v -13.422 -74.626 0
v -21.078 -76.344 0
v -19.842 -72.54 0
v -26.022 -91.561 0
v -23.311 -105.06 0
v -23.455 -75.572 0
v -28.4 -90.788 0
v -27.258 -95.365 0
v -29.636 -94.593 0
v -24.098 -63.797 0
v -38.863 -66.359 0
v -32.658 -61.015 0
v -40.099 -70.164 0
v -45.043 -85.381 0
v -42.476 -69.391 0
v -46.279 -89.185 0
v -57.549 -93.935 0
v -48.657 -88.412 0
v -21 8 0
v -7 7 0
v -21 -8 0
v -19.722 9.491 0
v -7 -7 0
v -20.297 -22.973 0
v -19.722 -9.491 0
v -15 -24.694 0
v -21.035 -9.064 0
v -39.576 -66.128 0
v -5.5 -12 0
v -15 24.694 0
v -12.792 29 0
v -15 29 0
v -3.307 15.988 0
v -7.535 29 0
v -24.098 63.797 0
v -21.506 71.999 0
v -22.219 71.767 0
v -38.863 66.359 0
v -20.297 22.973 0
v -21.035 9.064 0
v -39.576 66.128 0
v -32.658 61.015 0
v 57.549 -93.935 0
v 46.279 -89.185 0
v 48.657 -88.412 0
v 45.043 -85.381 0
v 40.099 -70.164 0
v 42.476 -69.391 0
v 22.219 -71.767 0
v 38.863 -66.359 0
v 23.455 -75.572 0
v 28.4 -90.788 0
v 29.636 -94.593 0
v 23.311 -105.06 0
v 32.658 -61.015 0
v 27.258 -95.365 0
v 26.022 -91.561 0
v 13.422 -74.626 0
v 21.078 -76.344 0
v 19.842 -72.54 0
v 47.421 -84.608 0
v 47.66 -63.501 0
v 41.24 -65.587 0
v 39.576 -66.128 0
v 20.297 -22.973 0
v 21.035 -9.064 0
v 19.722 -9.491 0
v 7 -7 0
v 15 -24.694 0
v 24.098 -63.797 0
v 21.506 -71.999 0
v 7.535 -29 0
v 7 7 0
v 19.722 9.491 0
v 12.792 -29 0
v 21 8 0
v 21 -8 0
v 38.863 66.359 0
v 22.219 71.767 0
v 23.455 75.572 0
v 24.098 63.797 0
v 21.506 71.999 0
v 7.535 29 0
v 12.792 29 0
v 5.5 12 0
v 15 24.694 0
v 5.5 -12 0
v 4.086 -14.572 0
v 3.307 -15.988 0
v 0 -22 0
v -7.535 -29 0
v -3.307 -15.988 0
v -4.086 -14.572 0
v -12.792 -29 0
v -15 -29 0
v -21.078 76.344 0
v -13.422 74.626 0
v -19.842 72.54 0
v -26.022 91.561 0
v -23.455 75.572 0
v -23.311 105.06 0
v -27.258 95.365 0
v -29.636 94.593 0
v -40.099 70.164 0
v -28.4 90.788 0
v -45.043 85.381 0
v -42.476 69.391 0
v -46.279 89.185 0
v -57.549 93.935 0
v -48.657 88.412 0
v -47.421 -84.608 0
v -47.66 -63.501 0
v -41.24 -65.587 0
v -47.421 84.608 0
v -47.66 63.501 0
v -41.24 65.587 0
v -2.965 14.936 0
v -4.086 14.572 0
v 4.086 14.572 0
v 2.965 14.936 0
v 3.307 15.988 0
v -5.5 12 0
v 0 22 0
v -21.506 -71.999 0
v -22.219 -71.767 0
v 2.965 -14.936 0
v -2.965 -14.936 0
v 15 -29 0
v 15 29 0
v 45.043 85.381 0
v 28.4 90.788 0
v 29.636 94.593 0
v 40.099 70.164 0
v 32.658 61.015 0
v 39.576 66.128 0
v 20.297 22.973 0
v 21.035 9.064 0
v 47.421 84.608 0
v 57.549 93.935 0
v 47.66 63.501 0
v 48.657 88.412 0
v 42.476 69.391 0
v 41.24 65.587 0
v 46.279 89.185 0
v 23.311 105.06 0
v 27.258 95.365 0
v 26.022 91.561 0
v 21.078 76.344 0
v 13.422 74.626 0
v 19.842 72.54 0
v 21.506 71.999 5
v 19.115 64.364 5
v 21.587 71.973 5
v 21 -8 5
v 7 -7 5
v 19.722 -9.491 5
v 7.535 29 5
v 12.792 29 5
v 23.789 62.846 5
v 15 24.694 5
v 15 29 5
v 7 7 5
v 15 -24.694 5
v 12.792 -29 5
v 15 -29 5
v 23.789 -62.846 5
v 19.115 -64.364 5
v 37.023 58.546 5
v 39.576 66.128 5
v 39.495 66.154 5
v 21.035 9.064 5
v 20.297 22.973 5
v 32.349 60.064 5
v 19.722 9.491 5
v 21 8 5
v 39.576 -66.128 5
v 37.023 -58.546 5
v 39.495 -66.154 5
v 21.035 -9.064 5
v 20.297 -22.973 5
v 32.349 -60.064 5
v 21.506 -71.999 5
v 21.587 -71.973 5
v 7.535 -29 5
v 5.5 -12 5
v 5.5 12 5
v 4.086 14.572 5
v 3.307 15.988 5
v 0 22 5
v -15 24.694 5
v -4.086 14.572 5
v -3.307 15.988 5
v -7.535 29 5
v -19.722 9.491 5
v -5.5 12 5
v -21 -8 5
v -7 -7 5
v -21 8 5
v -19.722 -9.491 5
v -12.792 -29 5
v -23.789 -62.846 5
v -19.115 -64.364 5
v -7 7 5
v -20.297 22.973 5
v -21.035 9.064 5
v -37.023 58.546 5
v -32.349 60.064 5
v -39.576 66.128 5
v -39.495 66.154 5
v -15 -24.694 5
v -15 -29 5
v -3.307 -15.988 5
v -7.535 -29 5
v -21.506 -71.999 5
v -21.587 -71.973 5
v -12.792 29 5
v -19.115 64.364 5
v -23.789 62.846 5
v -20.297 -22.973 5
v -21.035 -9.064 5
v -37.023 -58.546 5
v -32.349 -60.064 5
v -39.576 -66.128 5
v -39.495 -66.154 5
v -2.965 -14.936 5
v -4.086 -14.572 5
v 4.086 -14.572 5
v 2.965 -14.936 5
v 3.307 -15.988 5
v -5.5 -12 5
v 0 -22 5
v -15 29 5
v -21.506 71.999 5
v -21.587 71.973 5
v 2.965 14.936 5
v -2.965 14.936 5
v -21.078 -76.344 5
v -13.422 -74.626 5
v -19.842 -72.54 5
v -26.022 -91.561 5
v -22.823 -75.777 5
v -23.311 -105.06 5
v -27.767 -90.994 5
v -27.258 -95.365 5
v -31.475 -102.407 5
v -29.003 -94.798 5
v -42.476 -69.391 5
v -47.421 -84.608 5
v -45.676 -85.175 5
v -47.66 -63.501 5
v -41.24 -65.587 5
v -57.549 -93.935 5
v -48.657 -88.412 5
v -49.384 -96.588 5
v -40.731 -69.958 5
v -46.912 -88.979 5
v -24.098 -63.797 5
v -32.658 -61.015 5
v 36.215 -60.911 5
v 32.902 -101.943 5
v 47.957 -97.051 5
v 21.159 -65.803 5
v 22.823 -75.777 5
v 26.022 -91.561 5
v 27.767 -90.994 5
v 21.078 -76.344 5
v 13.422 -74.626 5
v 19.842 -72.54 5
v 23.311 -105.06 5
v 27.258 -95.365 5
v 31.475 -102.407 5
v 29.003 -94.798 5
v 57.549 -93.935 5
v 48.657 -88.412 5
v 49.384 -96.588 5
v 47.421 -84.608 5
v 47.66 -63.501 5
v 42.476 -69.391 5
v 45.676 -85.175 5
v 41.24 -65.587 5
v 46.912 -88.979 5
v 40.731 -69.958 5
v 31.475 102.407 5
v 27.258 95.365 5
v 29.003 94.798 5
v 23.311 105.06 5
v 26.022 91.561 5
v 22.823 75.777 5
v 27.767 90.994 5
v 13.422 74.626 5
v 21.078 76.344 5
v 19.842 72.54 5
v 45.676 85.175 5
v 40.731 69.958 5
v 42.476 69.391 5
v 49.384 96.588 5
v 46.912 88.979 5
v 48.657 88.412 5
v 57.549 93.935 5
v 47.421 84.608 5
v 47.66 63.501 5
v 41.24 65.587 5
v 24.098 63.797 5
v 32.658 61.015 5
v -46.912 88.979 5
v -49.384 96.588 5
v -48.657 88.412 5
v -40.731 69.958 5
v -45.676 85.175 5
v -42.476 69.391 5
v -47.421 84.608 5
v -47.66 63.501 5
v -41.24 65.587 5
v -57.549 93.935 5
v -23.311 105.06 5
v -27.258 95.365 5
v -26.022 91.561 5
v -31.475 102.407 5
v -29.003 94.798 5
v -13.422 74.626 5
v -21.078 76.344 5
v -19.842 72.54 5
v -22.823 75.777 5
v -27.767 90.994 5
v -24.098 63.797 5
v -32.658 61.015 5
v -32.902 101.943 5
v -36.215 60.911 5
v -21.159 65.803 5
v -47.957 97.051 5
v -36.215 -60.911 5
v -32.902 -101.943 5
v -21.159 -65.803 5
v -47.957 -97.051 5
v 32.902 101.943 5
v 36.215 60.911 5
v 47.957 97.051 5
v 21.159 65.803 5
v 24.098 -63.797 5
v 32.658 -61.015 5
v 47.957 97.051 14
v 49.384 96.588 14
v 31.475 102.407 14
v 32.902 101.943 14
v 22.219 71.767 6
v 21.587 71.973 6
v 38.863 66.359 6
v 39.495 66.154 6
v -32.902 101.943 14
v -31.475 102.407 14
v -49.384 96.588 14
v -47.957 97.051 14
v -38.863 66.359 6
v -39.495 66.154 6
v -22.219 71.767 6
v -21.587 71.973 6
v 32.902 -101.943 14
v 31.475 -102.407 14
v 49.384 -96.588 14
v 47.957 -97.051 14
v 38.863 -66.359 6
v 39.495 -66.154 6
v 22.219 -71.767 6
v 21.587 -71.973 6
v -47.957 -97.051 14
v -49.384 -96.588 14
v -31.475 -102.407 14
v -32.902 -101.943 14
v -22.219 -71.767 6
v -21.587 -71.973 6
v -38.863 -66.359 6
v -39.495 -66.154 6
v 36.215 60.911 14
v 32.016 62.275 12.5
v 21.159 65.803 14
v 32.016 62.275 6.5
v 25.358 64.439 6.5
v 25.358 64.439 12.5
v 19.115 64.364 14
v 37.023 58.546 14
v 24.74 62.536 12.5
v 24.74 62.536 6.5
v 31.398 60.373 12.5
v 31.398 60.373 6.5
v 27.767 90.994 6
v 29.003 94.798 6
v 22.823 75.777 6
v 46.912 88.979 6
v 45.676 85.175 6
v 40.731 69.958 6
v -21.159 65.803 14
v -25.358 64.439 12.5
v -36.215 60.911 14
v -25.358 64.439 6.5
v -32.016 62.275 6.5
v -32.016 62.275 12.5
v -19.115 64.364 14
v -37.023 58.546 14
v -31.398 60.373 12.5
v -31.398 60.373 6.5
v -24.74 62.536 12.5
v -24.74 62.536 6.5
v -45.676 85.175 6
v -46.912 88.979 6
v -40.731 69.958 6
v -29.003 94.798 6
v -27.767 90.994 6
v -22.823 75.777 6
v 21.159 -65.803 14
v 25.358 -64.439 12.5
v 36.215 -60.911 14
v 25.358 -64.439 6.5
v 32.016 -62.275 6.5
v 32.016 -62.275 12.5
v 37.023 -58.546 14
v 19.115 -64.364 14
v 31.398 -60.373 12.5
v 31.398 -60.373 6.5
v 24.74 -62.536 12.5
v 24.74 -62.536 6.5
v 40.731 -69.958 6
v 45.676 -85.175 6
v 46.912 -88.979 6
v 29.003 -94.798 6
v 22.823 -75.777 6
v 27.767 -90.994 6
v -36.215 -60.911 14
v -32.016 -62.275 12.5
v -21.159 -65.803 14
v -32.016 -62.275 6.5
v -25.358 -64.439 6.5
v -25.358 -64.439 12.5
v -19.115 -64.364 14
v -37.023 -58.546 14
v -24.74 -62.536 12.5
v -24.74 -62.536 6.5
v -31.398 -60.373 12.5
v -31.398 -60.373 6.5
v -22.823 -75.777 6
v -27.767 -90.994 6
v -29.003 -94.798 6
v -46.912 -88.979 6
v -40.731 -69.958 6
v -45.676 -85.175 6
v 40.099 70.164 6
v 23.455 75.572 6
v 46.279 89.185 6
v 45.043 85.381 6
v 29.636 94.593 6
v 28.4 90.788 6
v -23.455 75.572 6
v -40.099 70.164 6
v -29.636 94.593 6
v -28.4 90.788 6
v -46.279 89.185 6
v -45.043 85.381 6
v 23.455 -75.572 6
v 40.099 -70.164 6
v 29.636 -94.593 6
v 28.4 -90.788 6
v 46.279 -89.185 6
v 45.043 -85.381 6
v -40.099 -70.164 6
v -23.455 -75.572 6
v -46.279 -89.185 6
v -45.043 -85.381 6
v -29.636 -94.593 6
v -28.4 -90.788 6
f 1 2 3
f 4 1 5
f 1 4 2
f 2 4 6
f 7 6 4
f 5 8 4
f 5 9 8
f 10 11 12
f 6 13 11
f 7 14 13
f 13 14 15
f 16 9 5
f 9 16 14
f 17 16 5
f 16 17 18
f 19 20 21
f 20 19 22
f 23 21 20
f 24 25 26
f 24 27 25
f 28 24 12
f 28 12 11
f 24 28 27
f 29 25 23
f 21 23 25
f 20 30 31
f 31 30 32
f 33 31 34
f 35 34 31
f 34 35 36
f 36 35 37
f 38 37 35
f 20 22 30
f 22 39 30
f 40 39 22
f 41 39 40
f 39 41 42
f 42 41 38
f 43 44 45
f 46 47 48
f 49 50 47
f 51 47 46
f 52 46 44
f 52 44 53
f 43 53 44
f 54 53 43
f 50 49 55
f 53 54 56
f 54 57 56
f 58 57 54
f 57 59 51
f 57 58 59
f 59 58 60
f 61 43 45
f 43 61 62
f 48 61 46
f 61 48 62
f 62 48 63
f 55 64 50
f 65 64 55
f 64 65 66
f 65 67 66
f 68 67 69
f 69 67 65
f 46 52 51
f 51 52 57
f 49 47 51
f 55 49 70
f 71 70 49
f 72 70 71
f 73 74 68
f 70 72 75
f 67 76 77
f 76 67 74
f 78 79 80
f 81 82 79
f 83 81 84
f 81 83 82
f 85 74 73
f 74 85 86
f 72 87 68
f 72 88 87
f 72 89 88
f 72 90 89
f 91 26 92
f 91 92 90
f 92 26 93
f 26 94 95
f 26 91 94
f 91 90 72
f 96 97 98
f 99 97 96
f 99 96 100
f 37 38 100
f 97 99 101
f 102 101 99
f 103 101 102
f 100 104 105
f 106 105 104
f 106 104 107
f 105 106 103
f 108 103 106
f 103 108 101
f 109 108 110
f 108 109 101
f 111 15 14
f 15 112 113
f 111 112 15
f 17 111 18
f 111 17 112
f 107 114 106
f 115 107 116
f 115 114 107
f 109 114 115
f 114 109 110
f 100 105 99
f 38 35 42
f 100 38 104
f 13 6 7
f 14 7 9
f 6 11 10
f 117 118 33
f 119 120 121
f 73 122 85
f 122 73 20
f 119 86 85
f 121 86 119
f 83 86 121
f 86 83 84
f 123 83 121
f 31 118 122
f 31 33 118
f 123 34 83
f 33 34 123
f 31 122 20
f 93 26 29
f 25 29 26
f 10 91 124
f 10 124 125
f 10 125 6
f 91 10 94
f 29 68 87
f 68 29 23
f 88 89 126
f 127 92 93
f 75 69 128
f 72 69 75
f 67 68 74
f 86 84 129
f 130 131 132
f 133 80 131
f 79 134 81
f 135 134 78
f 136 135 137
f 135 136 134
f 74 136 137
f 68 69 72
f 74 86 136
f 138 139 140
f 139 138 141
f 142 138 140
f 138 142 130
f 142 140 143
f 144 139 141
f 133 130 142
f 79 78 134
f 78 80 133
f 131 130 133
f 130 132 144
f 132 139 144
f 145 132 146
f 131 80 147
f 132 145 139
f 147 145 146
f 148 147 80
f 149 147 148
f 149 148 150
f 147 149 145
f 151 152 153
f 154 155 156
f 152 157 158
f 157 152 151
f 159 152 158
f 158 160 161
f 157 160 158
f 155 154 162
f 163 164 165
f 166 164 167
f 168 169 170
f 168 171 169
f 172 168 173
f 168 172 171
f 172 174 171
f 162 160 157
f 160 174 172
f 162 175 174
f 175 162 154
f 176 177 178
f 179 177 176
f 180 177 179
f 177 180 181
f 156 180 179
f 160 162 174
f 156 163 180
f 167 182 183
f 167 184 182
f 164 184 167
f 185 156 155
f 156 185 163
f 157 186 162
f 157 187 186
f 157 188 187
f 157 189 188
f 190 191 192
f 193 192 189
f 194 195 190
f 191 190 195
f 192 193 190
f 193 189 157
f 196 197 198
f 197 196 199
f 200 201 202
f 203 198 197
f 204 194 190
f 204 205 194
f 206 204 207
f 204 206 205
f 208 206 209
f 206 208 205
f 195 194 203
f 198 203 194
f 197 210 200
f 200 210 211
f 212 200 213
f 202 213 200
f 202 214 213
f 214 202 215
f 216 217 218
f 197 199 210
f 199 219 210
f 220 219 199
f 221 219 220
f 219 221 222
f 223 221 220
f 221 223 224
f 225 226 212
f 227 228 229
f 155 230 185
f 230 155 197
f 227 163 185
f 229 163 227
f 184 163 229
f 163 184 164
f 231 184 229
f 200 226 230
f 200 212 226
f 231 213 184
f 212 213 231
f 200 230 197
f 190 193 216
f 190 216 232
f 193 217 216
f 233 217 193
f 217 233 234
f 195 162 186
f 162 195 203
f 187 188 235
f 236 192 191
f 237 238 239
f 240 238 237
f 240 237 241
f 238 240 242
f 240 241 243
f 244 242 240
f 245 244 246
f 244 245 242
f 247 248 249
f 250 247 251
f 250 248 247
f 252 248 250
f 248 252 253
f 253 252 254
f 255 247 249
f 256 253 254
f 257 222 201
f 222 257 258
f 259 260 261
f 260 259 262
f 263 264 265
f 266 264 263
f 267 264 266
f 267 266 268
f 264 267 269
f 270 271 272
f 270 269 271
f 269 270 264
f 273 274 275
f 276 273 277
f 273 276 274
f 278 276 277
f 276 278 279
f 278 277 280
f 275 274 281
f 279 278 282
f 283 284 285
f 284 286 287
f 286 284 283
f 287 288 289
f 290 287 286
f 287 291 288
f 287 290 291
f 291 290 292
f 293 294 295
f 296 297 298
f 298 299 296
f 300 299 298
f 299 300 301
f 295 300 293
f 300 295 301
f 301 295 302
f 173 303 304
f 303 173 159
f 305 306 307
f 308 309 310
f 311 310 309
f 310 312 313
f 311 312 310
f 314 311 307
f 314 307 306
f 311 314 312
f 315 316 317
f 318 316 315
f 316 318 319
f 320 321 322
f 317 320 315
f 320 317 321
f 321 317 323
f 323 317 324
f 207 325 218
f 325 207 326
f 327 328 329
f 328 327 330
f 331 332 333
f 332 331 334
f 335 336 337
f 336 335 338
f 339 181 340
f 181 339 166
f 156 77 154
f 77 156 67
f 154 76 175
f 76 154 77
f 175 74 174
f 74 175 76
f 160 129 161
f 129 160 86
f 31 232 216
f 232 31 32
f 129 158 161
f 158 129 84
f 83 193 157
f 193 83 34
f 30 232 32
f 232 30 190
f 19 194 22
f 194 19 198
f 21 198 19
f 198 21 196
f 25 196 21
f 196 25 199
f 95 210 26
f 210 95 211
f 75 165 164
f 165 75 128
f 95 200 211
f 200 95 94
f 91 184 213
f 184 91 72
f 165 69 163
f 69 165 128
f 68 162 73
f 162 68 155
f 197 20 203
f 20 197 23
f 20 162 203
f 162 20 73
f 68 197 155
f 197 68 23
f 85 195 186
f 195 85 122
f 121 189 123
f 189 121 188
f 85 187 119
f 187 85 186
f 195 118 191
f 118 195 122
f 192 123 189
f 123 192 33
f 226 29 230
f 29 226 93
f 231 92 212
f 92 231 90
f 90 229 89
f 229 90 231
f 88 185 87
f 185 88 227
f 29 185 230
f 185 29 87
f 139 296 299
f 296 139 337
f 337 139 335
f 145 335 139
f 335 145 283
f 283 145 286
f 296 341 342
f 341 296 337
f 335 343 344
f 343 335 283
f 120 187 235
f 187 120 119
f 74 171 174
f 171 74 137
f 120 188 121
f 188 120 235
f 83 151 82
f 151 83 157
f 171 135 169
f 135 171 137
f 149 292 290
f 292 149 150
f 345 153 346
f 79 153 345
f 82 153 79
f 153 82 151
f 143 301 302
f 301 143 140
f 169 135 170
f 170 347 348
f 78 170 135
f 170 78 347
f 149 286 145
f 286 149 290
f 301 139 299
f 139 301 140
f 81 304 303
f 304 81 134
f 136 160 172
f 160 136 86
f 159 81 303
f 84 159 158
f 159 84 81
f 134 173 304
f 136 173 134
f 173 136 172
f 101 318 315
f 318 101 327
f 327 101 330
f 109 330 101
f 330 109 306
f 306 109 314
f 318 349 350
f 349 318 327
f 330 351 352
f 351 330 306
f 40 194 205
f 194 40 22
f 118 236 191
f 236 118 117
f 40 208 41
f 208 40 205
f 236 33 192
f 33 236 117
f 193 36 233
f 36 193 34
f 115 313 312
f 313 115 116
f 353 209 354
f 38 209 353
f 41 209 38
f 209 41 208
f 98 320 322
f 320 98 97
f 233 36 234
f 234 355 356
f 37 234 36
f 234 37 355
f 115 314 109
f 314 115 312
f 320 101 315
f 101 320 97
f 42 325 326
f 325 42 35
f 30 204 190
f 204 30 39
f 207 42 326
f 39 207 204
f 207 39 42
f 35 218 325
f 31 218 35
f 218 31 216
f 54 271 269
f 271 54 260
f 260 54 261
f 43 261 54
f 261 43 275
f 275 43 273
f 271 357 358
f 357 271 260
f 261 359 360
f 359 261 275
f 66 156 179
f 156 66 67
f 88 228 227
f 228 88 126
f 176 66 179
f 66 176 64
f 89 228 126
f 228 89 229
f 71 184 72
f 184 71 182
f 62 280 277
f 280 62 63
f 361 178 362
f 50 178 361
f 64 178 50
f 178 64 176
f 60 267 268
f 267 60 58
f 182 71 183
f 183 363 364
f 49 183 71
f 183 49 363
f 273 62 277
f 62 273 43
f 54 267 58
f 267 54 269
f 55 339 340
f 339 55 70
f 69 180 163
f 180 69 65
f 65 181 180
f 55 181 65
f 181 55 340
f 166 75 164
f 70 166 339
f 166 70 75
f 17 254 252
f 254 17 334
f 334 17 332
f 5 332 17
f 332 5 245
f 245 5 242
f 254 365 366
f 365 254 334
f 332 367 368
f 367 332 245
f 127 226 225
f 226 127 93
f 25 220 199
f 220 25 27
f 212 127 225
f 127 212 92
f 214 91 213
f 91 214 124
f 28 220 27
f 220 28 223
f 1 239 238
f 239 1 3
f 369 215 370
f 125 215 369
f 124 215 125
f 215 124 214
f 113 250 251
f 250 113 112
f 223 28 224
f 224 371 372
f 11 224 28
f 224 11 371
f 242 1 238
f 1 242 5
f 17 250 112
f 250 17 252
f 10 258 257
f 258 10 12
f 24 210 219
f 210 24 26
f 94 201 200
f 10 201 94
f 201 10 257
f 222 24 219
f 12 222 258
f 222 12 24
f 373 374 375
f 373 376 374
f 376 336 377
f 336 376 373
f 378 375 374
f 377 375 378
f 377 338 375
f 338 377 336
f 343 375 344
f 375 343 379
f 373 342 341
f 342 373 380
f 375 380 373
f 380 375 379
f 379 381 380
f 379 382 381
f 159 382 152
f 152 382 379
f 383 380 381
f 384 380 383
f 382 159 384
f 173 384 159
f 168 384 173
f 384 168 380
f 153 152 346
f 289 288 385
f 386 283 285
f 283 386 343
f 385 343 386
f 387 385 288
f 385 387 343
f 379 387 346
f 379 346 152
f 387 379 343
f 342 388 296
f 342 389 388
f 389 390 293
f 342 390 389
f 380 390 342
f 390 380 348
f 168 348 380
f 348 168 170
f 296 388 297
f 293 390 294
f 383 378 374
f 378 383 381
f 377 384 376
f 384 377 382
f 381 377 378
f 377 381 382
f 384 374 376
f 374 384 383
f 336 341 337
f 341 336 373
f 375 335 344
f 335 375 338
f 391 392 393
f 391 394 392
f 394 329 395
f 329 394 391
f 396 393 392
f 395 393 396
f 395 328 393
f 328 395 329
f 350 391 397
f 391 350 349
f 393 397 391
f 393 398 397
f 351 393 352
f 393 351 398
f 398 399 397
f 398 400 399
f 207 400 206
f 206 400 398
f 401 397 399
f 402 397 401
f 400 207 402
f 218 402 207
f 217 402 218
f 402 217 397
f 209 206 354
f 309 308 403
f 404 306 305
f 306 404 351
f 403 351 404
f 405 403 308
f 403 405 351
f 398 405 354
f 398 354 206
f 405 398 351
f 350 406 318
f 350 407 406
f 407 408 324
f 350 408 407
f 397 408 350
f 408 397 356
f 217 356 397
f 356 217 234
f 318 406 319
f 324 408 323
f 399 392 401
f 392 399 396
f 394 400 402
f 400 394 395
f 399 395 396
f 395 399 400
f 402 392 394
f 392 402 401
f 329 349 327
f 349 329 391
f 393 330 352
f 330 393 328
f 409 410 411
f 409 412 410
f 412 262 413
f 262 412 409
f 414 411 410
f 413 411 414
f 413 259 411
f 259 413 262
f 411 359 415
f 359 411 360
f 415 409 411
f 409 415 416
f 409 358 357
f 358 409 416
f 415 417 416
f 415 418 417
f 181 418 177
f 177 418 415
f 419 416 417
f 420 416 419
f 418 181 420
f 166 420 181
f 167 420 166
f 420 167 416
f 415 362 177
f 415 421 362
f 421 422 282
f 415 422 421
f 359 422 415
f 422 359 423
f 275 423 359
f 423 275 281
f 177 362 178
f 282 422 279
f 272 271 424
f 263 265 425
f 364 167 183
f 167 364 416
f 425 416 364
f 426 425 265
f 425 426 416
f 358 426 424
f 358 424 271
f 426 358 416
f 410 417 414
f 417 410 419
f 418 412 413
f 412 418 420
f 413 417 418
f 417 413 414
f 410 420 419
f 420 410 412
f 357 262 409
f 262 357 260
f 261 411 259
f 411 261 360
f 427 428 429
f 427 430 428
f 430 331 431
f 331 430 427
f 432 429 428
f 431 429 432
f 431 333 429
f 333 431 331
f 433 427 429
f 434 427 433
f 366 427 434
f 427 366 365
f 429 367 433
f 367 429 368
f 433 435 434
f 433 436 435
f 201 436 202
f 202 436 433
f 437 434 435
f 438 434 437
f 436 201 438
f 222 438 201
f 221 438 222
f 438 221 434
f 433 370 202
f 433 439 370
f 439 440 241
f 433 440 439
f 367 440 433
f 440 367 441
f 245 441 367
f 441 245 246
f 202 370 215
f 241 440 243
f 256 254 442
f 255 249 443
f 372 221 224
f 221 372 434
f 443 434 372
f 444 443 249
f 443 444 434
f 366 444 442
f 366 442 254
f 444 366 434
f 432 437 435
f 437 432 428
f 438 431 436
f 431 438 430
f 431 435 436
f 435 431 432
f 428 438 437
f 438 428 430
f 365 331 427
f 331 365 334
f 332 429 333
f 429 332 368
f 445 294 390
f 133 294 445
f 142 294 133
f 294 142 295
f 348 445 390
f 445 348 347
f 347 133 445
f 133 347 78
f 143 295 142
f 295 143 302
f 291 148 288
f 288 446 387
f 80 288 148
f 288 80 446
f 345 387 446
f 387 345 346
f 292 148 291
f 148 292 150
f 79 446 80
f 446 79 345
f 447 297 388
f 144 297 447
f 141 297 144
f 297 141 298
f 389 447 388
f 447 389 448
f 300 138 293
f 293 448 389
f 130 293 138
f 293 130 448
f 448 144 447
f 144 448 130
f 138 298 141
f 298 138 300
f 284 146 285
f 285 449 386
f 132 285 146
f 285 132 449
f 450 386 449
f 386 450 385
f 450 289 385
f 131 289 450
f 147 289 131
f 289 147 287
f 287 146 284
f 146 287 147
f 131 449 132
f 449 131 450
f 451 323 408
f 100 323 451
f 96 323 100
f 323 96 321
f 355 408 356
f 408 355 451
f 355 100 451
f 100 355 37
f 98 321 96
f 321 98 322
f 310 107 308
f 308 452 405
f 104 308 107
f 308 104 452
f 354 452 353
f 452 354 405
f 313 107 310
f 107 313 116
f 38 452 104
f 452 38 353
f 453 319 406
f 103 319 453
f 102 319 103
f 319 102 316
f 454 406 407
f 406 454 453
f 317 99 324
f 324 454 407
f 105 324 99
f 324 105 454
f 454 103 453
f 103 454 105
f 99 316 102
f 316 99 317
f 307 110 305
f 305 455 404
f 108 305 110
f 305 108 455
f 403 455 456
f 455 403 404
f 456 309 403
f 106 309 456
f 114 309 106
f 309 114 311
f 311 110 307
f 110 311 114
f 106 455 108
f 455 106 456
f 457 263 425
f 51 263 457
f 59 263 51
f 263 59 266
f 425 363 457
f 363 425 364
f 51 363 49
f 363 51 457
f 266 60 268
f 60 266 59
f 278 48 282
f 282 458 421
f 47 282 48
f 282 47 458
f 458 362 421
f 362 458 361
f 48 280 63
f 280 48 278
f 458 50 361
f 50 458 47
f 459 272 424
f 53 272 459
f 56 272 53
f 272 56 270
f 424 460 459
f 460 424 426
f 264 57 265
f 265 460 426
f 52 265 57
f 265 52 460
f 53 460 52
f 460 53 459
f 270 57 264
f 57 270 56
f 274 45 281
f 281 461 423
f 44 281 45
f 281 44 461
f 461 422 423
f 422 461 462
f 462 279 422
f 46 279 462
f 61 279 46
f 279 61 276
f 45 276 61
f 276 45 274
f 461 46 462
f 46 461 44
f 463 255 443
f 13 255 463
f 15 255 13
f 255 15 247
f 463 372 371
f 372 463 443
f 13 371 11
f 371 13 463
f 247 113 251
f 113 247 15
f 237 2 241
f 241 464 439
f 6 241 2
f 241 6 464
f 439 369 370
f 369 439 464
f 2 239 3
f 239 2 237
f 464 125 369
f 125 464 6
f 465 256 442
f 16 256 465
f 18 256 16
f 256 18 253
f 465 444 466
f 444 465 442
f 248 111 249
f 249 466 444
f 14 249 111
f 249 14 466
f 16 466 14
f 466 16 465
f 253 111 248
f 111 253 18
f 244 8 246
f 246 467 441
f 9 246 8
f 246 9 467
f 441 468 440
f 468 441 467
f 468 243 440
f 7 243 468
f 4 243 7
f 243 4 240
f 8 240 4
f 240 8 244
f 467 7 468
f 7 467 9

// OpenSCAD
// Project Grace - initial printed skeleton.
// Dimensions are in millimetres. Motor holes and clamp features will be added later.

// Set to "motor_reference" to inspect the measured compound motor envelope.
view_mode = "skeleton";

// IMechE External Pipe Climber brief: commercial 22 mm copper pipe.
// A 2 mm undersize wheel gap preloads the tyres against the pipe for grip.
pipe_outer_diameter = 22;
wheel_gap_undersize = 2;
target_wheel_gap = pipe_outer_diameter - wheel_gap_undersize;

frame_thickness = 5;

// Central body.
center_width = 30;
center_height = 58;
center_opening_size = 14;
triangle_opening_width = 11;
triangle_opening_height = 10;

// Four identical arms and their solid motor-mount pads.
arm_length = 92;
arm_width = 19;
arm_slot_width = 9;
arm_slot_start = 13;
arm_slot_end_clearance = 7;
end_pad_length = 32;
end_pad_width = 36;
arm_angle = 72;

// Measured N20-style micro metal gearmotor envelope from the supplied photos.
// The total length includes the output shaft; the individual can and gearbox lengths are estimates.
motor_overall_length = 46.05;
motor_width = 15.23;
motor_thickness = 11.82;
motor_can_length = 22;
gearbox_length = 16;
output_shaft_length = motor_overall_length - motor_can_length - gearbox_length;
output_shaft_diameter = 3;

// Integrated holder dimensions. The motor sits directly on the frame surface.
motor_fit_clearance = 0.6;
holder_wall_thickness = 1.5;
holder_wall_height = 9;
holder_back_stop_thickness = 2;
holder_length = motor_can_length + gearbox_length + 2;
wire_exit_width = 7;
wire_exit_height = 6;
cable_tie_slot_width = 2.5;
cable_tie_slot_length = 4;
cable_tie_slot_positions = [10, 30];
cable_tie_slot_y = 10;

module arm_with_pad(root_x, root_y, angle) {
    arm_slot_length = arm_length - end_pad_length - arm_slot_start - arm_slot_end_clearance;

    translate([root_x, root_y, 0])
        rotate([0, 0, angle])
            difference() {
                union() {
                    translate([0, -arm_width / 2, 0])
                        cube([arm_length, arm_width, frame_thickness]);
                    translate([arm_length - end_pad_length, -end_pad_width / 2, 0])
                        cube([end_pad_length, end_pad_width, frame_thickness]);
                }

                // Long lightening slot, matching the reference skeleton.
                translate([arm_slot_start, -arm_slot_width / 2, -1])
                    cube([arm_slot_length, arm_slot_width, frame_thickness + 2]);
            }
}

module triangular_opening(y_position, points_up) {
    translate([0, y_position, -1])
        linear_extrude(height = frame_thickness + 2)
            if (points_up)
                polygon(points = [
                    [-triangle_opening_width / 2, -triangle_opening_height / 2],
                    [triangle_opening_width / 2, -triangle_opening_height / 2],
                    [0, triangle_opening_height / 2]
                ]);
            else
                polygon(points = [
                    [-triangle_opening_width / 2, triangle_opening_height / 2],
                    [triangle_opening_width / 2, triangle_opening_height / 2],
                    [0, -triangle_opening_height / 2]
                ]);
}

module center_body() {
    difference() {
        linear_extrude(height = frame_thickness)
            polygon(points = [
                [-center_width / 2, -center_height / 2],
                [center_width / 2, -center_height / 2],
                [center_width / 2, -center_height / 2 + 14],
                [center_width / 2 + 6, -8],
                [center_width / 2 + 6, 8],
                [center_width / 2, center_height / 2 - 14],
                [center_width / 2, center_height / 2],
                [-center_width / 2, center_height / 2],
                [-center_width / 2, center_height / 2 - 14],
                [-center_width / 2 - 6, 8],
                [-center_width / 2 - 6, -8],
                [-center_width / 2, -center_height / 2 + 14]
            ]);

        translate([-center_opening_size / 2, -center_opening_size / 2, -1])
            cube([center_opening_size, center_opening_size, frame_thickness + 2]);
        triangular_opening(center_opening_size / 2 + triangle_opening_height, true);
        triangular_opening(-center_opening_size / 2 - triangle_opening_height, false);
    }
}

module motor_holder() {
    holder_outer_width = motor_width + motor_fit_clearance + 2 * holder_wall_thickness;

    union() {
        // Rear stop prevents the motor moving towards the centre of the frame.
        difference() {
            translate([0, -holder_outer_width / 2, 0])
                cube([holder_back_stop_thickness, holder_outer_width, holder_wall_height]);
            translate([
                -1,
                -wire_exit_width / 2,
                (holder_wall_height - wire_exit_height) / 2
            ])
                cube([holder_back_stop_thickness + 2, wire_exit_width, wire_exit_height]);
        }

        // Low rails locate the compound motor without interfering with its gearbox or shaft.
        translate([0, -holder_outer_width / 2, 0])
            cube([holder_length, holder_wall_thickness, holder_wall_height]);
        translate([0, holder_outer_width / 2 - holder_wall_thickness, 0])
            cube([holder_length, holder_wall_thickness, holder_wall_height]);
    }
}

module motor_holder_tie_slots() {
    // Two tie stations prevent the motor rotating in its holder under drive torque.
    for (tie_x = cable_tie_slot_positions)
        for (side = [-1, 1])
            translate([
                tie_x - cable_tie_slot_length / 2,
                side * cable_tie_slot_y - cable_tie_slot_width / 2,
                -1
            ])
                cube([cable_tie_slot_length, cable_tie_slot_width, frame_thickness + 2]);
}

module holder_on_arm(root_x, root_y, angle) {
    translate([root_x, root_y, frame_thickness])
        rotate([0, 0, angle])
            translate([arm_length - holder_length, 0, 0])
                motor_holder();
}

module holder_slots_on_arm(root_x, root_y, angle) {
    translate([root_x, root_y, 0])
        rotate([0, 0, angle])
            translate([arm_length - holder_length, 0, 0])
                motor_holder_tie_slots();
}

module printed_skeleton() {
    difference() {
        union() {
            center_body();
            arm_with_pad(center_width / 2 - 3, center_height / 2 - 17, arm_angle);
            arm_with_pad(-center_width / 2 + 3, center_height / 2 - 17, 180 - arm_angle);
            arm_with_pad(center_width / 2 - 3, -center_height / 2 + 17, -arm_angle);
            arm_with_pad(-center_width / 2 + 3, -center_height / 2 + 17, arm_angle - 180);
            holder_on_arm(center_width / 2 - 3, center_height / 2 - 17, arm_angle);
            holder_on_arm(-center_width / 2 + 3, center_height / 2 - 17, 180 - arm_angle);
            holder_on_arm(center_width / 2 - 3, -center_height / 2 + 17, -arm_angle);
            holder_on_arm(-center_width / 2 + 3, -center_height / 2 + 17, arm_angle - 180);
        }

        holder_slots_on_arm(center_width / 2 - 3, center_height / 2 - 17, arm_angle);
        holder_slots_on_arm(-center_width / 2 + 3, center_height / 2 - 17, 180 - arm_angle);
        holder_slots_on_arm(center_width / 2 - 3, -center_height / 2 + 17, -arm_angle);
        holder_slots_on_arm(-center_width / 2 + 3, -center_height / 2 + 17, arm_angle - 180);
    }
}

module compound_motor_reference() {
    // Motor can, gearbox, and output shaft are separate volumes for mount design.
    color("silver")
        translate([0, -motor_width / 2, -motor_thickness / 2])
            cube([motor_can_length, motor_width, motor_thickness]);

    color("goldenrod")
        translate([motor_can_length, -motor_width / 2, -motor_thickness / 2])
            cube([gearbox_length, motor_width, motor_thickness]);

    color("dimgray")
        translate([motor_can_length + gearbox_length, 0, 0])
            rotate([0, 90, 0])
                cylinder(d = output_shaft_diameter, h = output_shaft_length);
}

if (view_mode == "motor_reference")
    compound_motor_reference();
else
    color("orange")
        printed_skeleton();
